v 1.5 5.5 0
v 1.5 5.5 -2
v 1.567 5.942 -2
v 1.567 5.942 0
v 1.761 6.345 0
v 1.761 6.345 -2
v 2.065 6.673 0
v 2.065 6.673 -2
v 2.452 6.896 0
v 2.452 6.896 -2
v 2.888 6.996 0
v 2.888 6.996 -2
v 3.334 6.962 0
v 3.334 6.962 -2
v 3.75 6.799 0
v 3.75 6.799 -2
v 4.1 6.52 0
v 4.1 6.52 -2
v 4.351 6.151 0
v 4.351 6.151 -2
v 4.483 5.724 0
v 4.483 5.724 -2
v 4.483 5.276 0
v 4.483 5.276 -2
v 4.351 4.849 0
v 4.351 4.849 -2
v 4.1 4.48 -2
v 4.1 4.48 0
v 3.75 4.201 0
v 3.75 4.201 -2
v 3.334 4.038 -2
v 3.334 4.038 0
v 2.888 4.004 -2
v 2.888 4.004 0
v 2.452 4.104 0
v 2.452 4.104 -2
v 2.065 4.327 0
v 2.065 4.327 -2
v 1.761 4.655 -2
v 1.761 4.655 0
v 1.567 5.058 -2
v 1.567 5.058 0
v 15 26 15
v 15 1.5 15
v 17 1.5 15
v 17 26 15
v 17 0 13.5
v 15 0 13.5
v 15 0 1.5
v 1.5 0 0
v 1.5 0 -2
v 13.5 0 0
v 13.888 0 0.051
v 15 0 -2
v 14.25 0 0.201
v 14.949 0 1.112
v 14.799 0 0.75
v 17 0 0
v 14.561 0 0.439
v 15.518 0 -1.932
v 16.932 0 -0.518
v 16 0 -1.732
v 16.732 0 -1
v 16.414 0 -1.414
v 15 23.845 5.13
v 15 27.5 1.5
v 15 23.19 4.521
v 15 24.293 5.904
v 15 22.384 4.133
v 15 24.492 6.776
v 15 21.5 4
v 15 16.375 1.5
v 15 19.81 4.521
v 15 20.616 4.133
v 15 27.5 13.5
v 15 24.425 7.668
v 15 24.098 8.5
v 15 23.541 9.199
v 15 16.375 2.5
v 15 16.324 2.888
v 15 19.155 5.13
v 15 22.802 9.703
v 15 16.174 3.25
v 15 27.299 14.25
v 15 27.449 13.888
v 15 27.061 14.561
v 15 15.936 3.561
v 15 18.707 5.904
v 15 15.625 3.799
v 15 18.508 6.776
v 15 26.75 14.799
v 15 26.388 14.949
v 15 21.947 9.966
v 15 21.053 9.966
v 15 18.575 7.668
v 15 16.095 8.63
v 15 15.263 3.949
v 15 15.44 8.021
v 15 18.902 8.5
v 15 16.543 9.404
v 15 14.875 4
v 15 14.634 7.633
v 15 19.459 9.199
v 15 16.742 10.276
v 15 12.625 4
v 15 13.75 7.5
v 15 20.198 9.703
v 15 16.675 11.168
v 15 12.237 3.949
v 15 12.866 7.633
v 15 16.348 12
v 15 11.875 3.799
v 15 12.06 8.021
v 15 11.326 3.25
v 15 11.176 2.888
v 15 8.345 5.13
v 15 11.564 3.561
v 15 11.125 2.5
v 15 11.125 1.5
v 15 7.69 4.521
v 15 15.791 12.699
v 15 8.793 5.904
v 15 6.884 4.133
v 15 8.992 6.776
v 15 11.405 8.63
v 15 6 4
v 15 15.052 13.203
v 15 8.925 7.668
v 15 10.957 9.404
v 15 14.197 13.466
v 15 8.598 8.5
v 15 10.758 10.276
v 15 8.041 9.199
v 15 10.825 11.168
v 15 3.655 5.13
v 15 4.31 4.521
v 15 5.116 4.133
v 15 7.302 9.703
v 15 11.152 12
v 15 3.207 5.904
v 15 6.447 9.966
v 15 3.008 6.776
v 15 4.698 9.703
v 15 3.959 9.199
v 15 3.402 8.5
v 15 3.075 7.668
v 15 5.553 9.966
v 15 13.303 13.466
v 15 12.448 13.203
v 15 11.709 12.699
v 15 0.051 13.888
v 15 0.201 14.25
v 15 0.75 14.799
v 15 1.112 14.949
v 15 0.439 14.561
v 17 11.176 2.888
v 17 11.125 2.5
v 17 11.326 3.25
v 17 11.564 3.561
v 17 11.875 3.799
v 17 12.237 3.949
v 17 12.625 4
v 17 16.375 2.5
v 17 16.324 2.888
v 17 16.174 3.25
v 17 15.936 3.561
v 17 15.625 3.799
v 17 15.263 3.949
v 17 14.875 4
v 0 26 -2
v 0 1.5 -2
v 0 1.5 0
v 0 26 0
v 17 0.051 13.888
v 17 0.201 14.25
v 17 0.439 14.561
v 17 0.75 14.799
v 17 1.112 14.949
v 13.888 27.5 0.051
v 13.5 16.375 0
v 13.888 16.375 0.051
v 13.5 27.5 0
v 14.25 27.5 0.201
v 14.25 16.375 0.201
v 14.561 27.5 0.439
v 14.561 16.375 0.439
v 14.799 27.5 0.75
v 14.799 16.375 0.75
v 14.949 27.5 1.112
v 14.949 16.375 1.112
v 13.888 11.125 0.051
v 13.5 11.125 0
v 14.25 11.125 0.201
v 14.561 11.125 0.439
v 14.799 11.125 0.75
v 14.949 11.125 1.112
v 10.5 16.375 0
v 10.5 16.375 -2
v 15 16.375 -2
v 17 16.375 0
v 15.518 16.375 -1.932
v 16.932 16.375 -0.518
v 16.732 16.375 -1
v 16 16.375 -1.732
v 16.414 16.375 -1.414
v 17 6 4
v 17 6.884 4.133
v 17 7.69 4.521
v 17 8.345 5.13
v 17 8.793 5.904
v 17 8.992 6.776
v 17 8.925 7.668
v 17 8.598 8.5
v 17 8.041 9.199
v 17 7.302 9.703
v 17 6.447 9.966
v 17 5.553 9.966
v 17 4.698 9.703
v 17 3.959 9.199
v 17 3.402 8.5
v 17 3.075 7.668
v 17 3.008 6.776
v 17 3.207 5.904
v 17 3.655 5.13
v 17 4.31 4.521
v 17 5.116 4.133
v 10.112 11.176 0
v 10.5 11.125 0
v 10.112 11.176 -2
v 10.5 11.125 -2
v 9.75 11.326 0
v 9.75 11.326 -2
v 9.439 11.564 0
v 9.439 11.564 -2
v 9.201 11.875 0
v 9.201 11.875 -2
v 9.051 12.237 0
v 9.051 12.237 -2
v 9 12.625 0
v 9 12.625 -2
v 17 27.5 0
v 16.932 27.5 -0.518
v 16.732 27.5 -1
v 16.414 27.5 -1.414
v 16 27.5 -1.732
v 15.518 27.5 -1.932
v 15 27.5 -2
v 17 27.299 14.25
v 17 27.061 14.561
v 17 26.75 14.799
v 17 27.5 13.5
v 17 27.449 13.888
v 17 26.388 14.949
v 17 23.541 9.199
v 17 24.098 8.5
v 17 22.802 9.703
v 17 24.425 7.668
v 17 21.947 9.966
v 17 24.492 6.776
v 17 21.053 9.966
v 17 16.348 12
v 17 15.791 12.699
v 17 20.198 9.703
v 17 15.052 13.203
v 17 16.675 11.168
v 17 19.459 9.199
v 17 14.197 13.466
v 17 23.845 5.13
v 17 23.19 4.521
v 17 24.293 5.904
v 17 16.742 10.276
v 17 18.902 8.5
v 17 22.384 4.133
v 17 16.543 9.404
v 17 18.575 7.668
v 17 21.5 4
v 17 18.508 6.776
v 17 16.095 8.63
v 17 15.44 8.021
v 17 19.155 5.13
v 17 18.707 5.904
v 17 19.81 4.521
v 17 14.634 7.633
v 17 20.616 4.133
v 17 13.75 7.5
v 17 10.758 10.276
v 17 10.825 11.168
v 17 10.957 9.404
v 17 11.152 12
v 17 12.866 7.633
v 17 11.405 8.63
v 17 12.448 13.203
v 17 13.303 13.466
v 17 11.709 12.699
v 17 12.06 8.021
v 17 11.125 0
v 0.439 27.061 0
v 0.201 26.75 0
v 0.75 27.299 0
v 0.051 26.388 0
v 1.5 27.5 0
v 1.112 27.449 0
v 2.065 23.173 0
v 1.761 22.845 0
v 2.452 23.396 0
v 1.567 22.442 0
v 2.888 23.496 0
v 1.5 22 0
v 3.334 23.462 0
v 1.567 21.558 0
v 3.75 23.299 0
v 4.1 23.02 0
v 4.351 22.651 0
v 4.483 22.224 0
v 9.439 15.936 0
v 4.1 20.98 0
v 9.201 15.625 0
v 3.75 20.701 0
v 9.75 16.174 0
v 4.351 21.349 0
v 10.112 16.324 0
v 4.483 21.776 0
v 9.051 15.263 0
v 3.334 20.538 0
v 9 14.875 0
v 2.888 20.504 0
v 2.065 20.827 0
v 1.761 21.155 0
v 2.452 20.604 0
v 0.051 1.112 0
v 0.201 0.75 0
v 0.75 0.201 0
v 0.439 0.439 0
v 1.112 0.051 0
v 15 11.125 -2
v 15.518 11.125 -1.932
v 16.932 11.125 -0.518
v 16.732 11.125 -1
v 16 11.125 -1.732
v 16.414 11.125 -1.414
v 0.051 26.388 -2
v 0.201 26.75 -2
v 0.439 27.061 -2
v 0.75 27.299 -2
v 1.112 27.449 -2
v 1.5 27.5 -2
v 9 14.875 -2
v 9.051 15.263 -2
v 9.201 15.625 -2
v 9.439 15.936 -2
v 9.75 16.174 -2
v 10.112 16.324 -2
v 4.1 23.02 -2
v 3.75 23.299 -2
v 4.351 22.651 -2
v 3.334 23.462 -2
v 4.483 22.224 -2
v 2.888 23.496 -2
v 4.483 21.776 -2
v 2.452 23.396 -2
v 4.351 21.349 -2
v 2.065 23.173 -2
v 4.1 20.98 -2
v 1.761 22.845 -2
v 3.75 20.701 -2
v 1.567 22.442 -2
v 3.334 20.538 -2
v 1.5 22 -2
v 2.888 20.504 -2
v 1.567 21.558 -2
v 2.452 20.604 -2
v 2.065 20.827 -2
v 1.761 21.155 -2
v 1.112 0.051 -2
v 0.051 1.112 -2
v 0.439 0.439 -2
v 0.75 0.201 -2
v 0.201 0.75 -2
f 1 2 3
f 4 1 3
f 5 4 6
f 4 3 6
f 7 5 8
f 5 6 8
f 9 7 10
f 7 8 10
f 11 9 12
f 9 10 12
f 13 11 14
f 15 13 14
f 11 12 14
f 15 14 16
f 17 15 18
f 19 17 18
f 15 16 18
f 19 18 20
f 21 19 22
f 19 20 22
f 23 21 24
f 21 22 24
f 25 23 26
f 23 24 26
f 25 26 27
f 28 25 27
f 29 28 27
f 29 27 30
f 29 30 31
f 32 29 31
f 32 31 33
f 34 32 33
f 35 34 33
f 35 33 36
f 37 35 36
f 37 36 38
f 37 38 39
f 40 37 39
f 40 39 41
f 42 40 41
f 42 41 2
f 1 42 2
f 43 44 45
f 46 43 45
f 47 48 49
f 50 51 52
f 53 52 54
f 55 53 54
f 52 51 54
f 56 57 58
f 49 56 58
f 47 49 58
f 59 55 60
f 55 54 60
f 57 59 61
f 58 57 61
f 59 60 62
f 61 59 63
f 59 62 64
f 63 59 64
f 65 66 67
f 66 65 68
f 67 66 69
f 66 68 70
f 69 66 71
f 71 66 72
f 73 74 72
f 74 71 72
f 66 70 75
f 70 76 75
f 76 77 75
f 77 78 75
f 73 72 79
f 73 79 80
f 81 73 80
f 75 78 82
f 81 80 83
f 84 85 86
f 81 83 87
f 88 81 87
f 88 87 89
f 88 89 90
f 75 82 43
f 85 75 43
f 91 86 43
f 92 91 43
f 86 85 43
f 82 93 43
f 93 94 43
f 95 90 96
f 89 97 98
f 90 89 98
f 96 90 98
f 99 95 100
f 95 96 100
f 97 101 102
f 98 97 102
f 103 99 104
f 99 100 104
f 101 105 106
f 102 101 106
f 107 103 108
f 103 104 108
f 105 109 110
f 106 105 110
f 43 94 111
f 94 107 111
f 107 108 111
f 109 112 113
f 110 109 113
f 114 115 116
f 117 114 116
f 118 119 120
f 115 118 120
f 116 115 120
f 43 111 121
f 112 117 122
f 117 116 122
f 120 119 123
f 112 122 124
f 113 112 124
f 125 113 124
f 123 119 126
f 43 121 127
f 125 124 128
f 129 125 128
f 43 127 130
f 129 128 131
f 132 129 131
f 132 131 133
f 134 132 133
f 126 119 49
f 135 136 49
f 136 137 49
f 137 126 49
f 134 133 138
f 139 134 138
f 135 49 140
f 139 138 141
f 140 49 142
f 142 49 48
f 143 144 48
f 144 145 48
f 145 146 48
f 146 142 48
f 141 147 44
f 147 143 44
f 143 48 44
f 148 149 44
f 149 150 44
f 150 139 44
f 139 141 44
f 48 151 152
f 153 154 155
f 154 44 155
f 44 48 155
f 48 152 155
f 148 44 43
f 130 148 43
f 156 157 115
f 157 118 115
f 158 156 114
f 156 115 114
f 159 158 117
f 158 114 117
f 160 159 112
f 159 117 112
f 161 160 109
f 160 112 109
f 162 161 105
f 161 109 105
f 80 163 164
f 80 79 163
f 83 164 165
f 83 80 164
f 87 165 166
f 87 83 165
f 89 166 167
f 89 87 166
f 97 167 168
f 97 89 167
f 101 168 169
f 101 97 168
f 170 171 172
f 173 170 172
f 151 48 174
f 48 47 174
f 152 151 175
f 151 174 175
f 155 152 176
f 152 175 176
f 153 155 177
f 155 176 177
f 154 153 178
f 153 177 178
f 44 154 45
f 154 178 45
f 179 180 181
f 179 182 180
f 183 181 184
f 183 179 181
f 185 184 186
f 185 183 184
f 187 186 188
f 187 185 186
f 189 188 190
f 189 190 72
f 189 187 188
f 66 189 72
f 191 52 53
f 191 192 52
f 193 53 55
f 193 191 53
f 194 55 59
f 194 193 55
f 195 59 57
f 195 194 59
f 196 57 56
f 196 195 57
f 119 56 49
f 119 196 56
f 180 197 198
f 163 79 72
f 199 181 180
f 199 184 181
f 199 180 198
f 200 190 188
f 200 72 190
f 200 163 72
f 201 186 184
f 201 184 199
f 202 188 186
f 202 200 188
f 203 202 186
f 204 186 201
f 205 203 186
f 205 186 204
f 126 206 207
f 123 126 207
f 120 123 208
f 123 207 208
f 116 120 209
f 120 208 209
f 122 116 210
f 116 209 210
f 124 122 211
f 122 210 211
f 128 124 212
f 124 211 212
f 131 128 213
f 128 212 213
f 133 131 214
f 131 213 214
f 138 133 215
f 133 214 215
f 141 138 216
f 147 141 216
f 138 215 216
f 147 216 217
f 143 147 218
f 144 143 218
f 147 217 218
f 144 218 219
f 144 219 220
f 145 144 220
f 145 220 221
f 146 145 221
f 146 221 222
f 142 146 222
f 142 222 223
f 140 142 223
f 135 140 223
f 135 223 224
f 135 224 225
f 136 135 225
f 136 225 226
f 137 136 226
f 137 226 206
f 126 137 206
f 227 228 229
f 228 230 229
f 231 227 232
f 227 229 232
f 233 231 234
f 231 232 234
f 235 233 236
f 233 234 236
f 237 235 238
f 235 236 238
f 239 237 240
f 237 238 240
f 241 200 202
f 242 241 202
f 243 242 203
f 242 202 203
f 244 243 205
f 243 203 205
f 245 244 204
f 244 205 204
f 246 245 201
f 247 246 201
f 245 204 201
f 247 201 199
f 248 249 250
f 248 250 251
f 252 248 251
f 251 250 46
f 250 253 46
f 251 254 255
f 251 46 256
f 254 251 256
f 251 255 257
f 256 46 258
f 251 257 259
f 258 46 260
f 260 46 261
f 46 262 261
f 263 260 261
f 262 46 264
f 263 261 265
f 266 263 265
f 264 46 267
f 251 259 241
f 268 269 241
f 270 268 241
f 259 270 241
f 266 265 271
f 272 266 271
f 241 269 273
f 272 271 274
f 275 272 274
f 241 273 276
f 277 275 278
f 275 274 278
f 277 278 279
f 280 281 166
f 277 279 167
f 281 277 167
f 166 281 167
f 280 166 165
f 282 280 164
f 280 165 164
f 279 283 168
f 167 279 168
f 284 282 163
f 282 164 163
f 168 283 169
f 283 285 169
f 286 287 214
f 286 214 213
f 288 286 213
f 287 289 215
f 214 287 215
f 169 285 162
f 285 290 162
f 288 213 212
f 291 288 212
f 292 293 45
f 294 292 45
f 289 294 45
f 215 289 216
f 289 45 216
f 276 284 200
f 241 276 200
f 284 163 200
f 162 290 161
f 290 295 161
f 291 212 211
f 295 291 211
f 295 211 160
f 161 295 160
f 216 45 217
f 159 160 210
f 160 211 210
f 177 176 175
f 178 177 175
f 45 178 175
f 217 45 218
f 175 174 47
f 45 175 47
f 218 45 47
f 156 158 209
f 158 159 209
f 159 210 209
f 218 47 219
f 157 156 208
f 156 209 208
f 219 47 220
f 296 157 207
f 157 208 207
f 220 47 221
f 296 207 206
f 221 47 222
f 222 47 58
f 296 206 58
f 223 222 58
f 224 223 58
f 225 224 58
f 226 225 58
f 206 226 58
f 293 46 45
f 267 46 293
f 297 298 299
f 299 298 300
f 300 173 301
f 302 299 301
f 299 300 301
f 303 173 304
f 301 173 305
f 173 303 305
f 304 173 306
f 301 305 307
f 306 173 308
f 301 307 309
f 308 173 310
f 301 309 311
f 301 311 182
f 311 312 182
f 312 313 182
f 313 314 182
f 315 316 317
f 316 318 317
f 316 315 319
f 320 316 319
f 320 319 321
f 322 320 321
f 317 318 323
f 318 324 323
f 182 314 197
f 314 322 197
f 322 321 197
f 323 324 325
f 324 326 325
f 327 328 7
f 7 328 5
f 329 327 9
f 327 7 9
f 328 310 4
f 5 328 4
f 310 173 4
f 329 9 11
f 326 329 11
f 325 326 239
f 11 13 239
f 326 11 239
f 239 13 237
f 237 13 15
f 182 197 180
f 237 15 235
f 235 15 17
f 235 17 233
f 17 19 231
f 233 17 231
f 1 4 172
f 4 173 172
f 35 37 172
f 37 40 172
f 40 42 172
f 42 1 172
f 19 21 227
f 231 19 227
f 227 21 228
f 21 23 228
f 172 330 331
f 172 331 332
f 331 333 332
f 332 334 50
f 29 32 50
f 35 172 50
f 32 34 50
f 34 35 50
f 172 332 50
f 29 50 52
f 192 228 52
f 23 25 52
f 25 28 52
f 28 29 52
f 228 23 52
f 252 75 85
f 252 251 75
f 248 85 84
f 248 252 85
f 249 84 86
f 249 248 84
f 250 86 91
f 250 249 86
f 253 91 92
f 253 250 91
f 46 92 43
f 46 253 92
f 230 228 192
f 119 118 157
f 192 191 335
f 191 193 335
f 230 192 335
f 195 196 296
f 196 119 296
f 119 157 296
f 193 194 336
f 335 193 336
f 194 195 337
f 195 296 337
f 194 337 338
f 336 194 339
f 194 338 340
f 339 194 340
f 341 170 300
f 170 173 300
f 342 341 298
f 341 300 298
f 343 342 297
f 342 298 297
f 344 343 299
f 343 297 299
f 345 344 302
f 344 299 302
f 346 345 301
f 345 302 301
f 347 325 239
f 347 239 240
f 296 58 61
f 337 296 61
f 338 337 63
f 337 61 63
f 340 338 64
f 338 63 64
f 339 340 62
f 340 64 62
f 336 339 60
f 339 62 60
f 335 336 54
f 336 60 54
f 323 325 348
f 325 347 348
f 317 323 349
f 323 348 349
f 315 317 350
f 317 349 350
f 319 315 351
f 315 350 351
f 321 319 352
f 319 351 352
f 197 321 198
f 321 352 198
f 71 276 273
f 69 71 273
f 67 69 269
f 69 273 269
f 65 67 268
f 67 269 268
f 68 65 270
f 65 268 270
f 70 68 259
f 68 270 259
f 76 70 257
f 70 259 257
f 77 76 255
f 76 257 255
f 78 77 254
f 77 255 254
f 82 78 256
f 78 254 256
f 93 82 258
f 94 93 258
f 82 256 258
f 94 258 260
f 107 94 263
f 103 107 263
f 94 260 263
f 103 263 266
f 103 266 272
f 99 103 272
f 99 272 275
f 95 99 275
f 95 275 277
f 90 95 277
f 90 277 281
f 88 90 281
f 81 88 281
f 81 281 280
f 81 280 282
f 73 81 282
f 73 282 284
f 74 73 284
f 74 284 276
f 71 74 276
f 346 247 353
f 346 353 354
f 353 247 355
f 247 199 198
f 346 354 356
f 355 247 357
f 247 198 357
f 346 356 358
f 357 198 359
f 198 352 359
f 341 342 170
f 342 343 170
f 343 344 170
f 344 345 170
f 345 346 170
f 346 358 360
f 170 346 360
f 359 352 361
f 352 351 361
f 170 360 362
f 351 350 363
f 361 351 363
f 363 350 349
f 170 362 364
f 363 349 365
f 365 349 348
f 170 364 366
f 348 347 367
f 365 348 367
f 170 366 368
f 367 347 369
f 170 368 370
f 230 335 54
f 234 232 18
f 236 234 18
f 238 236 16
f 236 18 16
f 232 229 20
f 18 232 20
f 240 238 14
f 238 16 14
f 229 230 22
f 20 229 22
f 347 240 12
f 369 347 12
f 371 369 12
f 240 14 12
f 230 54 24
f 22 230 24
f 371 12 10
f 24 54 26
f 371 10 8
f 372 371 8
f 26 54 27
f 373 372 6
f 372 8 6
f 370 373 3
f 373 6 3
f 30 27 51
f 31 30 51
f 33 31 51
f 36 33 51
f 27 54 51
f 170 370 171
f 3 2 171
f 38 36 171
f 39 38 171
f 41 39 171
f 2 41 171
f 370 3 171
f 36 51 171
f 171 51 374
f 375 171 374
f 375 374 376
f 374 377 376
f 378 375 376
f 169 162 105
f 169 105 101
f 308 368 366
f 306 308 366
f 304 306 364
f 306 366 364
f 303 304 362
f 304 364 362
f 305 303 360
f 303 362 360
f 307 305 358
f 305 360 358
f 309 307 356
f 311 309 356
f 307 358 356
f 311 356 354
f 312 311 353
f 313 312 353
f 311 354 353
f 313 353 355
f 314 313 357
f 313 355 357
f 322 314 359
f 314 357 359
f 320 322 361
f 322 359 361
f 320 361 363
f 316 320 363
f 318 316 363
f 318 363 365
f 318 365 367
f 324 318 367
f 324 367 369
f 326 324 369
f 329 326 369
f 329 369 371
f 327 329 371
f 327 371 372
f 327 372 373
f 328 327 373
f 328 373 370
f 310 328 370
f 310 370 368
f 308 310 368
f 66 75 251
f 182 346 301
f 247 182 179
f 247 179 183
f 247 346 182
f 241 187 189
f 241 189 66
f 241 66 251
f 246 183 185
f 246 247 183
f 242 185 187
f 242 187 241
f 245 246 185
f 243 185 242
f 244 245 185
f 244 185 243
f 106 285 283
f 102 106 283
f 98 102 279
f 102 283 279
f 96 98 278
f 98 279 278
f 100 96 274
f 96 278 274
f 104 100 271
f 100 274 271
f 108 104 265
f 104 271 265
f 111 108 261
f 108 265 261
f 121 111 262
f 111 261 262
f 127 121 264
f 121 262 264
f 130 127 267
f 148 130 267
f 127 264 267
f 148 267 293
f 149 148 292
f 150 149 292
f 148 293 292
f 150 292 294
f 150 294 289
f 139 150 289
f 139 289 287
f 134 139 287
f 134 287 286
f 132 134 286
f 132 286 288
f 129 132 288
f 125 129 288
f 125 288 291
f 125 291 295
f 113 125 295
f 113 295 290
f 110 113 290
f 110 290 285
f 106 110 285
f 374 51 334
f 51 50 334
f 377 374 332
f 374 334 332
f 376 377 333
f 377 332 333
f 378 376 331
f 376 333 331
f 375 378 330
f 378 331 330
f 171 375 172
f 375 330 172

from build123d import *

# Parameters (mm, degrees)
BOSS_EXTRUDE1_DEPTH = 27.5
SKETCH2_R           = 3
CUT_EXTRUDE1_DEPTH  = 27.5
SKETCH3_W           = 6
SKETCH3_H           = 5.25
CUT_EXTRUDE2_DEPTH  = 8
SKETCH4_R           = 1.5
CUT_EXTRUDE3_DEPTH  = 9
FILLET1_R           = 1.5


with BuildPart() as part:
    # Sketch1 → Boss-Extrude1 (new body)
    with BuildSketch(Plane(origin=(0, 0, 0), x_dir=(1, 0, 0), z_dir=(0, 1, 0))):
        with BuildLine():
            Line((0, 0), (15, 0))
            Line((15, 0), (15, -15))
            Line((15, -15), (17, -15))
            Line((17, -15), (17, 0))
            ThreePointArc((17, 0), (16.414213562, 1.414213562), (15, 2))
            Line((15, 2), (0, 2))
            Line((0, 2), (0, 0))
        make_face()
    extrude(amount=BOSS_EXTRUDE1_DEPTH)

    # Sketch2 → Cut-Extrude1 (cut)
    with BuildSketch(Plane(origin=(17, 0, 0), x_dir=(0, 0, -1), z_dir=(1, 0, 0))):
        with Locations((-7, 6)):
            Circle(SKETCH2_R)
        with Locations((-10.5, 13.75)):
            Circle(SKETCH2_R)
        with Locations((-7, 21.5)):
            Circle(SKETCH2_R)
    extrude(amount=-CUT_EXTRUDE1_DEPTH, mode=Mode.SUBTRACT)

    # Sketch3 → Cut-Extrude2 (cut)
    with BuildSketch(Plane(origin=(17, 0, 0), x_dir=(0, 0, -1), z_dir=(1, 0, 0))):
        with Locations((-1, 13.75)):
            Rectangle(SKETCH3_W, SKETCH3_H)
    extrude(amount=-CUT_EXTRUDE2_DEPTH, mode=Mode.SUBTRACT)

    # Sketch4 → Cut-Extrude3 (cut)
    with BuildSketch(Plane(origin=(0, 0, -2), x_dir=(-1, 0, 0), z_dir=(0, 0, -1))):
        with Locations((-3, 5.5)):
            Circle(SKETCH4_R)
        with Locations((-3, 22)):
            Circle(SKETCH4_R)
    extrude(amount=-CUT_EXTRUDE3_DEPTH, mode=Mode.SUBTRACT)

    # Fillet1
    fillet1_edges = [part.edges().sort_by_distance(p)[0] for p in [
        (0, 0, -1),
        (15, 21.9375, 0),
        (16, 27.5, 15),
        (15, 5.5625, 0),
        (16, 11.125, 4),
        (16, 16.375, 4),
        (9, 16.375, -1),
        (9, 11.125, -1),
        (0, 27.5, -1),
        (16, 0, 15),
    ]]
    fillet(fillet1_edges, radius=FILLET1_R)


solid = part.part
